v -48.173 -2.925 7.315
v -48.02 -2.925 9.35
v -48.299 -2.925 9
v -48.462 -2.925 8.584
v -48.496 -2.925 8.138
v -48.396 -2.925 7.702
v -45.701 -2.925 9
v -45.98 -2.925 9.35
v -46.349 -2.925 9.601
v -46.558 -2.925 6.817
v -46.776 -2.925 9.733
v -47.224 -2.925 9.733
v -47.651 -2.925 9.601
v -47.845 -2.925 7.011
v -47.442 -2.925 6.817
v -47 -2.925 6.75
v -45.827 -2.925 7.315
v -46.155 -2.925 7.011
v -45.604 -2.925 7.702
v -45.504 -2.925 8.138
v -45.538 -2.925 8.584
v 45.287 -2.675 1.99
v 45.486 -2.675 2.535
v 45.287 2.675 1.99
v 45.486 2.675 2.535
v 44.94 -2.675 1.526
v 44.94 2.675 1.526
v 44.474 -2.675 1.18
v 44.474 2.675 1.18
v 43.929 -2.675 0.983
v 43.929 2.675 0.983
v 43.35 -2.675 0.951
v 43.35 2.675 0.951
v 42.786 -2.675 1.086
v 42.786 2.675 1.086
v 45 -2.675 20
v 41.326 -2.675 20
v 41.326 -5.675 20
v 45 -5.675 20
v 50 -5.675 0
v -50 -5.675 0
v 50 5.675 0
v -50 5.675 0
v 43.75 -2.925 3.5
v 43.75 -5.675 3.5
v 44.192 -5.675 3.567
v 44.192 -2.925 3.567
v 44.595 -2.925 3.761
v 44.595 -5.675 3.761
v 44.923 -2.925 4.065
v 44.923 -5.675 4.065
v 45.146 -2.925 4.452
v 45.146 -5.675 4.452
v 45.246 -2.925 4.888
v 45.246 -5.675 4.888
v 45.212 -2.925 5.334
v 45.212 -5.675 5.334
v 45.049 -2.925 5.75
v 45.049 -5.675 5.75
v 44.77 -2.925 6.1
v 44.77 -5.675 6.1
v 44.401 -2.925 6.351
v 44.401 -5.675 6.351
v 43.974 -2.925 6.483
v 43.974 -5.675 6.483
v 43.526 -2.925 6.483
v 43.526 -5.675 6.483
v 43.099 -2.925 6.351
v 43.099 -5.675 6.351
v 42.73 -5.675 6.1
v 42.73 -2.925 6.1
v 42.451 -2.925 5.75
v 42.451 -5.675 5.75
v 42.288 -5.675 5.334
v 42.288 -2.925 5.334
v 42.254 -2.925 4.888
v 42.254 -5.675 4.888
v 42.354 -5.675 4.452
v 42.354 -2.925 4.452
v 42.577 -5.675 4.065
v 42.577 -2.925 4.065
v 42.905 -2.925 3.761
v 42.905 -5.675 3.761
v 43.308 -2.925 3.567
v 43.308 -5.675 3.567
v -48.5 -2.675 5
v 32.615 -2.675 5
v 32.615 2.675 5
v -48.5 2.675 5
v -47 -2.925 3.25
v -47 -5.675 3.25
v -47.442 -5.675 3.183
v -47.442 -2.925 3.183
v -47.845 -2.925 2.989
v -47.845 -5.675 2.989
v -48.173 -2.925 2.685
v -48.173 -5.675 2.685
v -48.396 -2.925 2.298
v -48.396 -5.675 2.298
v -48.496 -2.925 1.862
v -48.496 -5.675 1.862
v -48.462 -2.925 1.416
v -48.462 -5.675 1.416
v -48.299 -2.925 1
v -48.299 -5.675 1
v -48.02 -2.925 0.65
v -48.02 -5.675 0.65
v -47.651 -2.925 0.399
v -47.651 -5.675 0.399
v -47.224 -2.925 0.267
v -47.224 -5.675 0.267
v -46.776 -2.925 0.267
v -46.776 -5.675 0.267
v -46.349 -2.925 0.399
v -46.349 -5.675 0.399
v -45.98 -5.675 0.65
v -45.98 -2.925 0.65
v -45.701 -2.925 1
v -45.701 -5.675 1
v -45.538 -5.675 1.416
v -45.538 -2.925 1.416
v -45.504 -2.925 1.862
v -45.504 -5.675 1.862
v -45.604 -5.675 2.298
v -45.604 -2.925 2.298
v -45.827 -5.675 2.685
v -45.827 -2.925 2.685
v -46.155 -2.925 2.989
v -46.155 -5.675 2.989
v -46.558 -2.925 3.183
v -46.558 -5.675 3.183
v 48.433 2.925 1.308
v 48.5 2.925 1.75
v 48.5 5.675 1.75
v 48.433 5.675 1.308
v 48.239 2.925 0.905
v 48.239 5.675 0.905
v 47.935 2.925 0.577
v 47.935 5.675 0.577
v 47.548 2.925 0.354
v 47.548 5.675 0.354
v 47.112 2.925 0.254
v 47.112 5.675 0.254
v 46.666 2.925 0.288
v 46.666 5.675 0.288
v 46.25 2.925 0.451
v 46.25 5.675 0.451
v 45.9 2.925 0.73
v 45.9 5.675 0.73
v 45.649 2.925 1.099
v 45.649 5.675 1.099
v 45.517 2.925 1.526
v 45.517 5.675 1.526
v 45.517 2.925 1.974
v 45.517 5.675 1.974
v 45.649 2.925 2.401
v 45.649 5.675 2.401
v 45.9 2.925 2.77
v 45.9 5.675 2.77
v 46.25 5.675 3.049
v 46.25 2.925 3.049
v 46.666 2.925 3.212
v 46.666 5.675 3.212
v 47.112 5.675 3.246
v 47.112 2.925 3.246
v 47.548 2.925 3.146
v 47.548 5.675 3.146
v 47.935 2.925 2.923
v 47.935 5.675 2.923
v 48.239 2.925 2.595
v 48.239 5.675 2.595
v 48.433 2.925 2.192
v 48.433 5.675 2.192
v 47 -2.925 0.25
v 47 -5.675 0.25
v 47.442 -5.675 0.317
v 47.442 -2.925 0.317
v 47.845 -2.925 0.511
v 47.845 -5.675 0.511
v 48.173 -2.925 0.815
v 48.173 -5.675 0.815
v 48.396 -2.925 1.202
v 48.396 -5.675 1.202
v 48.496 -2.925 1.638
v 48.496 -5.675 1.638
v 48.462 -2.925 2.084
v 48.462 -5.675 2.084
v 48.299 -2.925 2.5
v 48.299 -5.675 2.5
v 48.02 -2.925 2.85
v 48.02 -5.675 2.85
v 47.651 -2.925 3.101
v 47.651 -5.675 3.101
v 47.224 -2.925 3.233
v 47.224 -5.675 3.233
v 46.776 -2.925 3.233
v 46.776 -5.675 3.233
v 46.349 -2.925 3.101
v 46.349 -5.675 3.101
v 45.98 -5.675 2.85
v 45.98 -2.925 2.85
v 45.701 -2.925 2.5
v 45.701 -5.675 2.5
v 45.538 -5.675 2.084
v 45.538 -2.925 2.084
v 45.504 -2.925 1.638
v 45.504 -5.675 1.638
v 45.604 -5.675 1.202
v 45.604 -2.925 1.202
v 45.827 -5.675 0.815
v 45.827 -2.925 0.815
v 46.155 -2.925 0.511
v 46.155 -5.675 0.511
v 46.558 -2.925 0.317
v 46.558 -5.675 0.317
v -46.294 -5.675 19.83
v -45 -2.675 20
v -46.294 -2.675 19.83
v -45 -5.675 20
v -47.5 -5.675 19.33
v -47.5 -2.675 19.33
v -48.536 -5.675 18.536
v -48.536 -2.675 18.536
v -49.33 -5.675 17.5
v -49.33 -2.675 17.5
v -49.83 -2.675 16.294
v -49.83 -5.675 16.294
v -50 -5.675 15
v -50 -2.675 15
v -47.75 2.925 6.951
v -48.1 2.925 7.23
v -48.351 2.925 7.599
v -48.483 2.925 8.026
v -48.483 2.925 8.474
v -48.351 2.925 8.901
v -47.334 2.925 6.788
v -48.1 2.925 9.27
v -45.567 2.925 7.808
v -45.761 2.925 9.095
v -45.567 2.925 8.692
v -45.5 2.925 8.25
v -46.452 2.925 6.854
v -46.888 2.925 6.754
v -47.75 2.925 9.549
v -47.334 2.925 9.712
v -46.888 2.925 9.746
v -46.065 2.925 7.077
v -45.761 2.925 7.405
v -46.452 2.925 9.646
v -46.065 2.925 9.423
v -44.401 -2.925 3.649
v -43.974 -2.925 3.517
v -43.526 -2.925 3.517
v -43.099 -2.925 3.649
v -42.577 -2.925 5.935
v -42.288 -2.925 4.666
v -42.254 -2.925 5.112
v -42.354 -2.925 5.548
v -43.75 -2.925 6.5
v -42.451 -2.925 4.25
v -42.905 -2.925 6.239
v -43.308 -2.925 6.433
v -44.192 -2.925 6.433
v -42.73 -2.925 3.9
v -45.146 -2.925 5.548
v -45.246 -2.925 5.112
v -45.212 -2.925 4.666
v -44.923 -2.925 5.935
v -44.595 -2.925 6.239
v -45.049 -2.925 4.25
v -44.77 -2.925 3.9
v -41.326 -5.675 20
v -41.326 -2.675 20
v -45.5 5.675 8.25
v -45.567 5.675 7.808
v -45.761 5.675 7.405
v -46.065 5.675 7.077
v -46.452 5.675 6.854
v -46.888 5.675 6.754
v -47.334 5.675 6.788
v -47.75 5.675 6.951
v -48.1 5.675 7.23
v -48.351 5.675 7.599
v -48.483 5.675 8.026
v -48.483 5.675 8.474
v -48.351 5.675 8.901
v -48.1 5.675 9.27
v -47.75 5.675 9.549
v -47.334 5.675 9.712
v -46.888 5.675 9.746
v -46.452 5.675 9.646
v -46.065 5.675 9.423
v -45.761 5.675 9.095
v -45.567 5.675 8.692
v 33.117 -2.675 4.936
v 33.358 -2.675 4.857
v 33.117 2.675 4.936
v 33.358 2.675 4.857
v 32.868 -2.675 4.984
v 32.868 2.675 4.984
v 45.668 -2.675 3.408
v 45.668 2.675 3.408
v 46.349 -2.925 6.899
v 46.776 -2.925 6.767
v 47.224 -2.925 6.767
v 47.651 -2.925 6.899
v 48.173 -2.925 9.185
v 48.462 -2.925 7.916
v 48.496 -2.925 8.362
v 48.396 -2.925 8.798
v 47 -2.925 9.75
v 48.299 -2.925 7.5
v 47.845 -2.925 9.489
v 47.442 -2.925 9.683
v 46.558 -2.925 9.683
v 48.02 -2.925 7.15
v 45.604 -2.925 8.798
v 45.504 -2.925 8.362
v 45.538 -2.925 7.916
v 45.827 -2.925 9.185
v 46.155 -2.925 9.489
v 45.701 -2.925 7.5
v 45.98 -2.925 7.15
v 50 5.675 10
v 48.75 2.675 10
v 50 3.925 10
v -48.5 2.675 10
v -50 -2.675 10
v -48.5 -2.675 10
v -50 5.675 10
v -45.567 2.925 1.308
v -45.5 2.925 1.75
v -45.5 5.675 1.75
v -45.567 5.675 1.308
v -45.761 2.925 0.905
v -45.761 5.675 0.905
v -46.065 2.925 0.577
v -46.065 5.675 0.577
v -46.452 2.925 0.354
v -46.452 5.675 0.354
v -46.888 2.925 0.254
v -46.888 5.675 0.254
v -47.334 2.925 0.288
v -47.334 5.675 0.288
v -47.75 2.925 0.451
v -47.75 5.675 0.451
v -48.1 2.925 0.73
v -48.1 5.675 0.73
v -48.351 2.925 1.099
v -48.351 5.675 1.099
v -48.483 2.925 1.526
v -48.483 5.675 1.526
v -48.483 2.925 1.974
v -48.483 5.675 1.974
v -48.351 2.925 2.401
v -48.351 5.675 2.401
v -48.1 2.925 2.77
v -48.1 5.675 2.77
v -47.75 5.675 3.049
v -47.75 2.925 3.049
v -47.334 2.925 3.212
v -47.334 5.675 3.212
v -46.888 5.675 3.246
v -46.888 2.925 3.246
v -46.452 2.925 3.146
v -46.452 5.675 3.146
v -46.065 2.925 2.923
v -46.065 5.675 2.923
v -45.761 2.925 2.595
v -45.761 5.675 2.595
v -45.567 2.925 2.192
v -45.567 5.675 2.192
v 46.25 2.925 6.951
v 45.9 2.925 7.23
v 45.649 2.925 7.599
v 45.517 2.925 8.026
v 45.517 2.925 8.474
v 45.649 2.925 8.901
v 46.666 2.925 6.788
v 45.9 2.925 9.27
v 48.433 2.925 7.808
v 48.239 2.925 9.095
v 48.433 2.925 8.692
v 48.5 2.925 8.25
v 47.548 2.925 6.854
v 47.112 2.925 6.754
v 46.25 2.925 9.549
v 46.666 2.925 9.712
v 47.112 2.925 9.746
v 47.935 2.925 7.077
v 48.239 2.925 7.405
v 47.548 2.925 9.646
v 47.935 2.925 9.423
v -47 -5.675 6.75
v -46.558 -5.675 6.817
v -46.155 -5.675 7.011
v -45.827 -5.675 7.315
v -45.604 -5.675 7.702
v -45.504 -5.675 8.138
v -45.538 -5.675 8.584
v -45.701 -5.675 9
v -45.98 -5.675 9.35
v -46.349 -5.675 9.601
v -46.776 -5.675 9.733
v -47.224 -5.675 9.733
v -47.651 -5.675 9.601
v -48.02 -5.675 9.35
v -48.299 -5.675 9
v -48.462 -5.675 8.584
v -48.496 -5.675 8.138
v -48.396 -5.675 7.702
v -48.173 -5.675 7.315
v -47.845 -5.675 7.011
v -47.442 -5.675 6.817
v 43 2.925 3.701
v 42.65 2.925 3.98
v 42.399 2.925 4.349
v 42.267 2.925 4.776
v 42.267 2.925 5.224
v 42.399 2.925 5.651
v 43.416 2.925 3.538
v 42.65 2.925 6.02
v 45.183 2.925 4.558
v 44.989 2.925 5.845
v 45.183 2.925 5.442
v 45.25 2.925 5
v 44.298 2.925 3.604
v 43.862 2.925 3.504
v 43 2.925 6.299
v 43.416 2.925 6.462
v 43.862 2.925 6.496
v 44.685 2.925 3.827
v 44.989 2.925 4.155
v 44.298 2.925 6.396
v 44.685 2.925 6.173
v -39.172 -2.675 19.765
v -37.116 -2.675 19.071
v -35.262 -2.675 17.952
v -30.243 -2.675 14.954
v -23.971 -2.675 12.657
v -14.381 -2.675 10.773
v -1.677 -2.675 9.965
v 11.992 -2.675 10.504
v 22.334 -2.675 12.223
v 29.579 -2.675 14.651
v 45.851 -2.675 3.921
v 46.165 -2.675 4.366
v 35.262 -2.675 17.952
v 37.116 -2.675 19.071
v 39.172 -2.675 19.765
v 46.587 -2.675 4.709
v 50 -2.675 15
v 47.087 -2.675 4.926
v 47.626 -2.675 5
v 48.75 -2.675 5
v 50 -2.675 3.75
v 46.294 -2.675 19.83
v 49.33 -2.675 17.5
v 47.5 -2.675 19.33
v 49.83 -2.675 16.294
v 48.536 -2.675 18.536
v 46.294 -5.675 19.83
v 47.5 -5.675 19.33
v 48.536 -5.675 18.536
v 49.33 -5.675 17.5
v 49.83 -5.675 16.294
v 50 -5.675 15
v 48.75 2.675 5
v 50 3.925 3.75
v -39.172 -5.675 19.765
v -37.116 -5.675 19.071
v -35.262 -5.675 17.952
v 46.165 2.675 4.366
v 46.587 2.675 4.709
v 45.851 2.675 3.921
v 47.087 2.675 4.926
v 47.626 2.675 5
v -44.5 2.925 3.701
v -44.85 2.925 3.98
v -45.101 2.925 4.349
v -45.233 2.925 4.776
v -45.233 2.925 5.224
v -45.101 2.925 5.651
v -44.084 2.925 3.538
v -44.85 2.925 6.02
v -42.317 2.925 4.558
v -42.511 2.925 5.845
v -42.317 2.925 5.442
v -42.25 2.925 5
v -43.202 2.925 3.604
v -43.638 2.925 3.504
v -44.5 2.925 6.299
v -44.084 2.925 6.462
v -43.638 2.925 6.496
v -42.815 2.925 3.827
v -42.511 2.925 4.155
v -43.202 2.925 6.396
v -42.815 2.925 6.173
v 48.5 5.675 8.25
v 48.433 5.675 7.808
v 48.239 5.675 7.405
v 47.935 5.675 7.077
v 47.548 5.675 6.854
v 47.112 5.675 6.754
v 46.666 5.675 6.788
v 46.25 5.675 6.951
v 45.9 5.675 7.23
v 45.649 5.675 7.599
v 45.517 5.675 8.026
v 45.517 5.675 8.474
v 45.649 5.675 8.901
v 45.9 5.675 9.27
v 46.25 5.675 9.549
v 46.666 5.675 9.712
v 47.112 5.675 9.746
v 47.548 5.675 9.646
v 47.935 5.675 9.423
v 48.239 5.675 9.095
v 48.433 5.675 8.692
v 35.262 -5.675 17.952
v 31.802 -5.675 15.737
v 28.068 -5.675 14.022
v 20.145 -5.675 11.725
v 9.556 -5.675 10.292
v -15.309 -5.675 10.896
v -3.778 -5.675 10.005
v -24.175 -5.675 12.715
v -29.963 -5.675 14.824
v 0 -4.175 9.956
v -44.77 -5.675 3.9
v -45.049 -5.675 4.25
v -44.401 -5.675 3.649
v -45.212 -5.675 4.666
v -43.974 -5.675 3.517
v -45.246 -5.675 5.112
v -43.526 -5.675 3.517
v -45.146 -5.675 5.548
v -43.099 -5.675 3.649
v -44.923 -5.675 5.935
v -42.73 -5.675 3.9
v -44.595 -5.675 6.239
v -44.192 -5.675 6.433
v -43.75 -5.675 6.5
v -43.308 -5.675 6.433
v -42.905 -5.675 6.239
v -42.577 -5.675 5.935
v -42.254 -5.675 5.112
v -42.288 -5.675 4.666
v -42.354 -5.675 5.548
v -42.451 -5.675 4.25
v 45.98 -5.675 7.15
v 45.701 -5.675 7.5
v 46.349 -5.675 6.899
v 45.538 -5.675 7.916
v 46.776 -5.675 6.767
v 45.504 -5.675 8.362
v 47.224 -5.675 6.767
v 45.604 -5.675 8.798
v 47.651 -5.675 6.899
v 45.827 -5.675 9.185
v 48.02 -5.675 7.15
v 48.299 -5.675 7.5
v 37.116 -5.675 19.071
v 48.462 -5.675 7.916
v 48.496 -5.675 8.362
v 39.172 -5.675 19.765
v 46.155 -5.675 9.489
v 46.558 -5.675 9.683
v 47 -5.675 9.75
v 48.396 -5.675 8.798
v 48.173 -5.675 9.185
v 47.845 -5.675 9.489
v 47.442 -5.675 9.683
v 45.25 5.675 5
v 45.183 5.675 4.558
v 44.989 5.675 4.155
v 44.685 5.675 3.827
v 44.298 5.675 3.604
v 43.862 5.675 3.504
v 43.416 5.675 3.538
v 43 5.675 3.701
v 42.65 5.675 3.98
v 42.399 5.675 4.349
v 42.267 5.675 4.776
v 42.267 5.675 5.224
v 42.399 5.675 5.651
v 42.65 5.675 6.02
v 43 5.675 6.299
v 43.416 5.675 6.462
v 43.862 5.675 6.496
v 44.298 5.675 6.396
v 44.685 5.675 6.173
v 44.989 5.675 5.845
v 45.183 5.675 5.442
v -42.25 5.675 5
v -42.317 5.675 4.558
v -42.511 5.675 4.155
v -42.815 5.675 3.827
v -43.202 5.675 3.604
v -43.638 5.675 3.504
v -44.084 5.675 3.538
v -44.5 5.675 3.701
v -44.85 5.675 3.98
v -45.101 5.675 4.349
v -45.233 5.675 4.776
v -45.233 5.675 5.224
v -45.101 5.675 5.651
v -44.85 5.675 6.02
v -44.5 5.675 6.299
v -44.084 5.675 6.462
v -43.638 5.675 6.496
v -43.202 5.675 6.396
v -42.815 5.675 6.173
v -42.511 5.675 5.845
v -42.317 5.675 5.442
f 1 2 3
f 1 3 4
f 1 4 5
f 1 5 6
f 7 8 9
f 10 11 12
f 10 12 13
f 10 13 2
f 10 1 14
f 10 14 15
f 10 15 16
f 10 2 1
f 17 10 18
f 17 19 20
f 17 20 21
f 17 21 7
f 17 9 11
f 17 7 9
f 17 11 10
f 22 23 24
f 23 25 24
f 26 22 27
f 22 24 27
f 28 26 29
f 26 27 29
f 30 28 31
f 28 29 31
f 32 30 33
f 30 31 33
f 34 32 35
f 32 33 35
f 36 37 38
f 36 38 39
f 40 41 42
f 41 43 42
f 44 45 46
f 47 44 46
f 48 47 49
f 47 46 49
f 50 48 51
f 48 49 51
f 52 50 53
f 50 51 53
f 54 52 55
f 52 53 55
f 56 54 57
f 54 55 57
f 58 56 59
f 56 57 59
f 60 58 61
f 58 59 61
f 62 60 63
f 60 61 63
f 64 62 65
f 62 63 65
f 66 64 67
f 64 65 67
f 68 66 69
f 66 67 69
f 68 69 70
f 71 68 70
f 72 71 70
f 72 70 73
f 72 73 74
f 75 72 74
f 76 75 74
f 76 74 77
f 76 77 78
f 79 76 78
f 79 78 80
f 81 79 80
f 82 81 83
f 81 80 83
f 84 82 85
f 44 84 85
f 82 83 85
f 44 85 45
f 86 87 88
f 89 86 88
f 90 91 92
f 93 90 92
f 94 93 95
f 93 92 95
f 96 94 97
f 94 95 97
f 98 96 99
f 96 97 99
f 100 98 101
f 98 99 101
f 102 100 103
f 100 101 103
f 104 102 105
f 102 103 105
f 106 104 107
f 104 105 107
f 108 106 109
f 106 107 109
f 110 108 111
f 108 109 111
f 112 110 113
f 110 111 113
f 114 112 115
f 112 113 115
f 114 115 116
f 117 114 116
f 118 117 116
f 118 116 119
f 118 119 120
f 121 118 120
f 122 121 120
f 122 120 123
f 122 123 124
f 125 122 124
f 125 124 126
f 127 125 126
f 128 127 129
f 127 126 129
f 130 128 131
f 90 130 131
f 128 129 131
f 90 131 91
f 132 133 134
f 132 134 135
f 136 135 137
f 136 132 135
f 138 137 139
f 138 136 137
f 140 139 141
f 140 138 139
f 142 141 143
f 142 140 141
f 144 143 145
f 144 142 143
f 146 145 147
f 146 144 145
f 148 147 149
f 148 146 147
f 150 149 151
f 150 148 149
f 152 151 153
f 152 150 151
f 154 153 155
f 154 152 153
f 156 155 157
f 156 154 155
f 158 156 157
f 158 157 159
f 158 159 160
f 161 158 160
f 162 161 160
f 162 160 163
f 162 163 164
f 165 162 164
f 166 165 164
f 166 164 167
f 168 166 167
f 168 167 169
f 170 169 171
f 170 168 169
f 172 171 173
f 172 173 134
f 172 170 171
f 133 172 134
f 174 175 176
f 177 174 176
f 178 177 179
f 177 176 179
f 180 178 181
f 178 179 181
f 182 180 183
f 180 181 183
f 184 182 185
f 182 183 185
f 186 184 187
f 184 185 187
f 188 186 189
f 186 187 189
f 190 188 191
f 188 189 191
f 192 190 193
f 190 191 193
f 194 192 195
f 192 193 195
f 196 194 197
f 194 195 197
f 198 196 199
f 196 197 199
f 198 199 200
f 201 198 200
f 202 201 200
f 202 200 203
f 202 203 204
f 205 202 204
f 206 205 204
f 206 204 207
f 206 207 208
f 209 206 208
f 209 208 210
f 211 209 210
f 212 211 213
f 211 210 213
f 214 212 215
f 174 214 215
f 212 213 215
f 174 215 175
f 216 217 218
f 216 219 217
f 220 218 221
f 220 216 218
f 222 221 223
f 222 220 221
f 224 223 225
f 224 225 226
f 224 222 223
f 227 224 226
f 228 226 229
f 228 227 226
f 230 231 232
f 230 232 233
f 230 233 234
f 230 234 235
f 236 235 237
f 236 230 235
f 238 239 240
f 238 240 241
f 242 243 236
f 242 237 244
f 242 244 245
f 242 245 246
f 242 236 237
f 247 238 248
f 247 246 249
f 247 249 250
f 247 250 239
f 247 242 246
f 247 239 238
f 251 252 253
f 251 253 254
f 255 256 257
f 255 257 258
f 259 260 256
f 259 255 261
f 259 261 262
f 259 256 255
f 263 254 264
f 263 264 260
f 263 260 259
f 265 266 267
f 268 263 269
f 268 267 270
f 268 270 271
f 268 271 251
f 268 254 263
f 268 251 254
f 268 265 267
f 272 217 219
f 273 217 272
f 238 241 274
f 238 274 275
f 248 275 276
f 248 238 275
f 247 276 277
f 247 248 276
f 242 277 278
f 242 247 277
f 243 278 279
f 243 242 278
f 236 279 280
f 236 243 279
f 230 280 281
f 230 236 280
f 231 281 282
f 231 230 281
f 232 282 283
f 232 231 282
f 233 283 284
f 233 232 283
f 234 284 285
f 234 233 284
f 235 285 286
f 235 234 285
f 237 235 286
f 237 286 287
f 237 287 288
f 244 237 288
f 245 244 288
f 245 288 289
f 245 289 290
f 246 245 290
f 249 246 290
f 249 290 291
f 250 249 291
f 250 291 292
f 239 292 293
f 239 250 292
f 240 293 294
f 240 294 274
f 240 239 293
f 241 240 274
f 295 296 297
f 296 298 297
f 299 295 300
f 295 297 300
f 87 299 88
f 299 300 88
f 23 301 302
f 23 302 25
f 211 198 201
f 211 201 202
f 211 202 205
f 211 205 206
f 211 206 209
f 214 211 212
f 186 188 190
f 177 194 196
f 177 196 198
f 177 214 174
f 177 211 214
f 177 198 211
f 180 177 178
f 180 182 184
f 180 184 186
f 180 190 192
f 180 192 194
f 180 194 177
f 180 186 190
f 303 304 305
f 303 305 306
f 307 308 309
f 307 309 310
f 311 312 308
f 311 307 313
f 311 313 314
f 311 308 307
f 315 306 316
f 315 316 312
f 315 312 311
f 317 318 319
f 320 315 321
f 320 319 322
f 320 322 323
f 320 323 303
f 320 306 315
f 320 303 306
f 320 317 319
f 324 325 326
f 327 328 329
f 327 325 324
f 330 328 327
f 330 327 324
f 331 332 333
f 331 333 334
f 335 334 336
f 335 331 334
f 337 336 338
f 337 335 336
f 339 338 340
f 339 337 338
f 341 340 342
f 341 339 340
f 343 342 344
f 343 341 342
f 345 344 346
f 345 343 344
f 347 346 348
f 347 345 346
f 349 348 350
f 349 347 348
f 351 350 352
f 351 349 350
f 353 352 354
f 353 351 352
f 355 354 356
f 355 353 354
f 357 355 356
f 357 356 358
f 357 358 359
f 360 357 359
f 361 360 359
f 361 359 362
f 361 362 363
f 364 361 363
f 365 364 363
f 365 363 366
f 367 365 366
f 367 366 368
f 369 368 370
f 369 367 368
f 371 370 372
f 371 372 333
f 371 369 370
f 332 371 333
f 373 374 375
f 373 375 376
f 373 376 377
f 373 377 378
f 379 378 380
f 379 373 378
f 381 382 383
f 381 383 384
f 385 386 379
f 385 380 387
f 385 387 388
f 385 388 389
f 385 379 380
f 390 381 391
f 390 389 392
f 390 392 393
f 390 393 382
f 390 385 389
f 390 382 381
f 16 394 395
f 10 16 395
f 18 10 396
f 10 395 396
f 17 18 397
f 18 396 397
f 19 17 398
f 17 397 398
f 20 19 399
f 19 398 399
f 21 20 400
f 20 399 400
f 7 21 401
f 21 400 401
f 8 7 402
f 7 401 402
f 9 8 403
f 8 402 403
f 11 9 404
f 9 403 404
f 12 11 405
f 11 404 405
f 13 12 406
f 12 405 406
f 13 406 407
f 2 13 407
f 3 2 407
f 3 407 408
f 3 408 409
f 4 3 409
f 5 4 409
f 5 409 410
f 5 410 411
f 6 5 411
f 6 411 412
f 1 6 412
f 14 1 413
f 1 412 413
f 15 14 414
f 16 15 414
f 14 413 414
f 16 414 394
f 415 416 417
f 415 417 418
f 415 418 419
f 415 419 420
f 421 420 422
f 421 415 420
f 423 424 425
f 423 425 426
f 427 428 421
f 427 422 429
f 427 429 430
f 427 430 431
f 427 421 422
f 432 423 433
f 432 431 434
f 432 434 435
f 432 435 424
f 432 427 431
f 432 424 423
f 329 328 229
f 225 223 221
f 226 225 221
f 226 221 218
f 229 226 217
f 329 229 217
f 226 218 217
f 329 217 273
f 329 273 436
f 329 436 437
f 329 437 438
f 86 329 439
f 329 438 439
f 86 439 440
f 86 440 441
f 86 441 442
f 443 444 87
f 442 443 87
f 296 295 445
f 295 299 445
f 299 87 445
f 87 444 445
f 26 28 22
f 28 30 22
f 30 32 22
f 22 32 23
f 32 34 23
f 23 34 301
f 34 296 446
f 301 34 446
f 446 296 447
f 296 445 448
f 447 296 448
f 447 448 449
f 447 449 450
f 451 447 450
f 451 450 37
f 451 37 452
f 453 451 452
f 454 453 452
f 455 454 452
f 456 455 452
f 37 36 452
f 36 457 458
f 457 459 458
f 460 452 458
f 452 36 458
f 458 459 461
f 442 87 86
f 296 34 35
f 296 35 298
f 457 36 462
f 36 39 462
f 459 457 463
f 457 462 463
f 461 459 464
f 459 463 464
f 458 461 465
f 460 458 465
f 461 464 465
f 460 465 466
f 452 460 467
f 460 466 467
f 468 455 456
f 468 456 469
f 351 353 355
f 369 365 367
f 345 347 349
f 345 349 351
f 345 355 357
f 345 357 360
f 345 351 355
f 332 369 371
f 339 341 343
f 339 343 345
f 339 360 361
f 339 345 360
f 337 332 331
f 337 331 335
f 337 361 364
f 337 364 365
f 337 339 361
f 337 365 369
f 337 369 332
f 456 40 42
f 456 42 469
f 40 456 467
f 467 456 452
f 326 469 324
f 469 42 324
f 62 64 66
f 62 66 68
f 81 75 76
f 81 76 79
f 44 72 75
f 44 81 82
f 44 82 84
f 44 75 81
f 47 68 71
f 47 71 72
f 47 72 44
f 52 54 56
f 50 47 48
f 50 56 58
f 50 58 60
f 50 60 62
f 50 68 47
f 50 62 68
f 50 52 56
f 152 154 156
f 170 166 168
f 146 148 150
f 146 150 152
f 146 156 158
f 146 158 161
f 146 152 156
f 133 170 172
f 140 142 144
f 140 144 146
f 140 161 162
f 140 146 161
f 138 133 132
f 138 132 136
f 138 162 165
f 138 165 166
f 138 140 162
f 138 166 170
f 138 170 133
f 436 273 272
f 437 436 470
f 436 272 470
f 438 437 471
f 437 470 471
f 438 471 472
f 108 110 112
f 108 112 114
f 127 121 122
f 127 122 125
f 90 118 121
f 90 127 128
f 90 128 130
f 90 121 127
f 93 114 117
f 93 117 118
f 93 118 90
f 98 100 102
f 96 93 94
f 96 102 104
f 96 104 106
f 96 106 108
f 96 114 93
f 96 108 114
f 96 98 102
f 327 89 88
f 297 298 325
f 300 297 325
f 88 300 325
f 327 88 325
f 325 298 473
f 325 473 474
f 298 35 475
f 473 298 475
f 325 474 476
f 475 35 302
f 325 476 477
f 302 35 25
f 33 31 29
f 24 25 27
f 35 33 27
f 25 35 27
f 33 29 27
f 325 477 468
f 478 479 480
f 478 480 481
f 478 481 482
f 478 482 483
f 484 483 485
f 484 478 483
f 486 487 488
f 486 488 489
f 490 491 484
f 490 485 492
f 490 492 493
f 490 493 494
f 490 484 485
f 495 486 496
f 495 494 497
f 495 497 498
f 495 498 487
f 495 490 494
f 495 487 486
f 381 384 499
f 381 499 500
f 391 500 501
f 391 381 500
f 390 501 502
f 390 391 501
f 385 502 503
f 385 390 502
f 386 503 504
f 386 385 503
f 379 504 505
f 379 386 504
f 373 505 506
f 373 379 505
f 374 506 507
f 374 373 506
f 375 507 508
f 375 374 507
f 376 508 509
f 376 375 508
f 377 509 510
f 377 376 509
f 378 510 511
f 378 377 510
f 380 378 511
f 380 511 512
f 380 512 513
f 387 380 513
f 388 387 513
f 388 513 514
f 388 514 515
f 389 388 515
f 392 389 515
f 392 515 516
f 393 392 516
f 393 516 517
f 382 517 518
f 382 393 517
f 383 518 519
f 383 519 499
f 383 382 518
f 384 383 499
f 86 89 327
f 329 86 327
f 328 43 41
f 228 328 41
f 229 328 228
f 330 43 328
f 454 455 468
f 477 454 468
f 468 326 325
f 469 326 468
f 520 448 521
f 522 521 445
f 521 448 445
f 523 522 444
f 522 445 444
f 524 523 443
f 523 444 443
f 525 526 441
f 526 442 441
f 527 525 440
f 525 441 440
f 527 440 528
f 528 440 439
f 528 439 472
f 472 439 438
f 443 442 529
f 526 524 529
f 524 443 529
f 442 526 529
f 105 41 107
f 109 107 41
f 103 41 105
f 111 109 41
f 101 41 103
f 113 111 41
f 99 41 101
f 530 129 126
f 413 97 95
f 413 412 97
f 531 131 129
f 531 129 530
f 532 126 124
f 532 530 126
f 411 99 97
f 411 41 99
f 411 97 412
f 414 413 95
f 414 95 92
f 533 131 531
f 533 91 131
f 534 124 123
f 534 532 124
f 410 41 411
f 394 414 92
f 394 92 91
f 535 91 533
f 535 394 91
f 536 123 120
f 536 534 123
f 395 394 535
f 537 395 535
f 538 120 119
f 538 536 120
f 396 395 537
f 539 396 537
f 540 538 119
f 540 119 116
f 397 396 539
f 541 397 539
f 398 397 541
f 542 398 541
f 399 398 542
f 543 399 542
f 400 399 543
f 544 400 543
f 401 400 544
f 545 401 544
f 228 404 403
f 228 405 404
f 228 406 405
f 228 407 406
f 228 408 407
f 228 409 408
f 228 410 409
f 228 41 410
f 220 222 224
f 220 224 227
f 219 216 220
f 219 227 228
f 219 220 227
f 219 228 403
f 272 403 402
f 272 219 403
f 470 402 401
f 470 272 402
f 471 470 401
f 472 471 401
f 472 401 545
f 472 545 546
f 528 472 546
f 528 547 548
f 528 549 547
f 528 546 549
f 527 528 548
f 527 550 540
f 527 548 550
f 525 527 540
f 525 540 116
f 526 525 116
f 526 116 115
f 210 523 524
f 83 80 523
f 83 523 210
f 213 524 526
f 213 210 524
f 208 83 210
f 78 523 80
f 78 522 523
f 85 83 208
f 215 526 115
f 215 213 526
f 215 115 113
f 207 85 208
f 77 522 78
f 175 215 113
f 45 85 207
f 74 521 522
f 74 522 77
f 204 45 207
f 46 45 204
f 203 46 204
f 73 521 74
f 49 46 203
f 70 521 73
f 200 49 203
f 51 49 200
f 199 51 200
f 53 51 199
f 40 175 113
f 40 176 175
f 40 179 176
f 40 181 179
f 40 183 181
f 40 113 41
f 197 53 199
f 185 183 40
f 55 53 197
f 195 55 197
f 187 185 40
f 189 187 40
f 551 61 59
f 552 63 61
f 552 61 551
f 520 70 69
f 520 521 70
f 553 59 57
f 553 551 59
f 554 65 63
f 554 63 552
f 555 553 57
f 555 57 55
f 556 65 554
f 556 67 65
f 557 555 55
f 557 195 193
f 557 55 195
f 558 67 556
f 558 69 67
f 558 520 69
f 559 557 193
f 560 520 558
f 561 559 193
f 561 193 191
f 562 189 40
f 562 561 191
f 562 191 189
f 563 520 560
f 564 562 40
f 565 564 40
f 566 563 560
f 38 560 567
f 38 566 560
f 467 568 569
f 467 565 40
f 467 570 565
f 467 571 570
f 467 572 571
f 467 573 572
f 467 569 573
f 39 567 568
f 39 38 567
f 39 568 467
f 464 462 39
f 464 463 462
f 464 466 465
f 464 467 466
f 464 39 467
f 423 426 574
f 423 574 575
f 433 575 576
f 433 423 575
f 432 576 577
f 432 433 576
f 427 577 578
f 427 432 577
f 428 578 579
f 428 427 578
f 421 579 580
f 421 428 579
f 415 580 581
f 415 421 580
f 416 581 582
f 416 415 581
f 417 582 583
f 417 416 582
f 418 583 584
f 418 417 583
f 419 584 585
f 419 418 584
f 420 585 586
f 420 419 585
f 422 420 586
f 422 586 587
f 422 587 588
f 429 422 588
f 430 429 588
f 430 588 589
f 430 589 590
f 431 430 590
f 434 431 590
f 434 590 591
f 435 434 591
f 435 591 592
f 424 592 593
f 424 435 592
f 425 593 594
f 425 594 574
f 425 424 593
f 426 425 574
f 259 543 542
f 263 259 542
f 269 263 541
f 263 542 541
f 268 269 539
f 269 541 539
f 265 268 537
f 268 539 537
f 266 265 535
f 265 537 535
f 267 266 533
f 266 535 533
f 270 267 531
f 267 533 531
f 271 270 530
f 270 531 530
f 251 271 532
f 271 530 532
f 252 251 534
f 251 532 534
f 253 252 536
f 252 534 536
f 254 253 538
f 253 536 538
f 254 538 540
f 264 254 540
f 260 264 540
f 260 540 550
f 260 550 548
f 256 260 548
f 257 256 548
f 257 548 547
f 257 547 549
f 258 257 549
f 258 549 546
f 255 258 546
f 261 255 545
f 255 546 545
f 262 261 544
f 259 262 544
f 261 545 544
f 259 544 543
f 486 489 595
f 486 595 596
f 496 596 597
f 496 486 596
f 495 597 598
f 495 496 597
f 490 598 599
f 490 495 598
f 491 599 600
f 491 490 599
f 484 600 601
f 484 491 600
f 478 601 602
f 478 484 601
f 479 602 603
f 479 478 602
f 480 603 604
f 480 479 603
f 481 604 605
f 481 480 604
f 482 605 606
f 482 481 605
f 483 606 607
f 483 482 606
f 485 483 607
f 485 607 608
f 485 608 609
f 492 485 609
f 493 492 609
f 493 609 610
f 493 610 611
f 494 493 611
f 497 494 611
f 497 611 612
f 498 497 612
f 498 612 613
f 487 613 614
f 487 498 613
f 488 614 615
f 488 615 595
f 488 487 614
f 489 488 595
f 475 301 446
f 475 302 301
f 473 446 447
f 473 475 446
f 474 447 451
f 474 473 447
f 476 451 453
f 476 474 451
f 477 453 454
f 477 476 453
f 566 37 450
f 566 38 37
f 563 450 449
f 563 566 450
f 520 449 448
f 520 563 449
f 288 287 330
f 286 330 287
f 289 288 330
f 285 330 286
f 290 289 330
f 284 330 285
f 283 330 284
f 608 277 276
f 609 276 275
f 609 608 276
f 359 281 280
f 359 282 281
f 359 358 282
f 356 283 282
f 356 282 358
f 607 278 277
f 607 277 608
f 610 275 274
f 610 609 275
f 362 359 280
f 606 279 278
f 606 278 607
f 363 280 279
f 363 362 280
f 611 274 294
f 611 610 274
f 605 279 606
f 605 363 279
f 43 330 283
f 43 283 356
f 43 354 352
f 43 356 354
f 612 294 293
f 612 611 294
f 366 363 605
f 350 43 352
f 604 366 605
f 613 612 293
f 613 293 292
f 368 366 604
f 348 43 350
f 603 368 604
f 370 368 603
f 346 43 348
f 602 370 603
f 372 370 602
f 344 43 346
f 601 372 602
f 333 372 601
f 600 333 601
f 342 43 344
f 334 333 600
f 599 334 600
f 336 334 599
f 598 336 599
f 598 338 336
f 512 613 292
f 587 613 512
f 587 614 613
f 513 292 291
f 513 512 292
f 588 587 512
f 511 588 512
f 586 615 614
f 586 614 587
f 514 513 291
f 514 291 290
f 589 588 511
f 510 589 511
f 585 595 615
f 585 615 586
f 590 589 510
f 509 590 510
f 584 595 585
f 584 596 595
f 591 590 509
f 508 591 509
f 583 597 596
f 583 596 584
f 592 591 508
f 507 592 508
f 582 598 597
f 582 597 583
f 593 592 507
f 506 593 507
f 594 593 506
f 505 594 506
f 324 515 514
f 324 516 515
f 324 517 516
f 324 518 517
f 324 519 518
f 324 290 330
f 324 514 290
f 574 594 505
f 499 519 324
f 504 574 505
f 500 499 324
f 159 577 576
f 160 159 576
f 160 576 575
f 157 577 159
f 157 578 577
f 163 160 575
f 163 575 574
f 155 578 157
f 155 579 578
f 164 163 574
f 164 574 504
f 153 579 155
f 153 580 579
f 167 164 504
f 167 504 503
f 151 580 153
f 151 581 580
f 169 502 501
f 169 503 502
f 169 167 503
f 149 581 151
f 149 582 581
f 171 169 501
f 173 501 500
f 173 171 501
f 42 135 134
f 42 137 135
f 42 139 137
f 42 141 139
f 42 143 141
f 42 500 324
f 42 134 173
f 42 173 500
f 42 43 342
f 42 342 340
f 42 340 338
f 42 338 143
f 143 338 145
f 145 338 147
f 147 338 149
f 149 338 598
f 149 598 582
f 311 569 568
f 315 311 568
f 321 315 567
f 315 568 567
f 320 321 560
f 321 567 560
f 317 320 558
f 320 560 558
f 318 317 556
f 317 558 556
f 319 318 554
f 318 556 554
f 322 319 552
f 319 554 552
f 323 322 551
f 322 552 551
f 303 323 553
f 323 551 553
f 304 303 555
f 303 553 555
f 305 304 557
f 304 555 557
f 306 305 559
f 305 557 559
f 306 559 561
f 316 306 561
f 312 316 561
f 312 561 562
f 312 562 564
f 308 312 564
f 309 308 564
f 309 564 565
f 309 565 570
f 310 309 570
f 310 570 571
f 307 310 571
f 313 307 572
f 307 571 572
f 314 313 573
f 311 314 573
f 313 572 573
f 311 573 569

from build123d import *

# Parameters (mm, degrees)
ESBO_O1_W                = 5
ESBO_O1_H                = 5.35
RESSALTO_EXTRUS_O1_DEPTH = 50
CORTE_EXTRUS_O5_START    = -2.675
CORTE_EXTRUS_O5_DEPTH    = 5.35
FILETE2_R                = 2
SKETCH1_W                = 100
SKETCH1_H                = 10
BOSS_EXTRUDE1_DEPTH      = 3
SKETCH2_W                = 100
SKETCH2_H                = 20
BOSS_EXTRUDE2_DEPTH      = 3
FILLET1_R                = 2
FILLET2_R                = 2
CUT_EXTRUDE1_START       = 2.925
CUT_EXTRUDE1_OUTLINE_R   = 1.5
CUT_EXTRUDE1_DEPTH       = 2.75
SKETCH6_W                = 5
SKETCH6_H                = 5.35
BOSS_EXTRUDE4_DEPTH      = 1.5
SKETCH8_R                = 1.5
CUT_EXTRUDE2_DEPTH       = 2.75
CHAMFER2_SIZE            = 1.25
CUT_EXTRUDE3_DEPTH       = 10
FILLET3_R                = 10
FILLET4_R                = 5


# Read off the part's stored shape, not the designer's step: Corte-extrusão5, Cut-Extrude1
with BuildPart() as part:
    # Esboço1 → Ressalto-extrusão1 (new, symmetric)
    with BuildSketch(Plane(origin=(0, 0, 0), x_dir=(0, 0, -1), z_dir=(1, 0, 0))):
        with Locations((-2.5, 0)):
            Rectangle(ESBO_O1_W, ESBO_O1_H)
    extrude(amount=RESSALTO_EXTRUS_O1_DEPTH, both=True)

    # Corte-extrusão5 outline → Corte-extrusão5 (cut)
    with BuildSketch(Plane(origin=(0, 0, 0), x_dir=(1, 0, 0), z_dir=(0, 1, 0)).offset(CORTE_EXTRUS_O5_START)):
        Polygon((46, -5), (45, -0.2), (33, -5), align=None)
    extrude(amount=CORTE_EXTRUS_O5_DEPTH, mode=Mode.SUBTRACT)

    # Filete2
    filete2_edges = [part.edges().sort_by_distance(p)[0] for p in [
        (46, 0, 5),
    ]]
    fillet(filete2_edges, radius=FILETE2_R)

    # Sketch1 → Boss-Extrude1 (add)
    with BuildSketch(Plane(origin=(0, 2.675, 0), x_dir=(1, 0, 0), z_dir=(0, 1, 0))):
        with Locations((0, -5)):
            Rectangle(SKETCH1_W, SKETCH1_H)
    extrude(amount=BOSS_EXTRUDE1_DEPTH)

    # Sketch2 → Boss-Extrude2 (add)
    with BuildSketch(Plane.XZ.offset(2.675)):
        with Locations((0, 10)):
            Rectangle(SKETCH2_W, SKETCH2_H)
    extrude(amount=BOSS_EXTRUDE2_DEPTH)

    # Fillet1
    fillet1_edges = [part.edges().sort_by_distance(p)[0] for p in [
        (45, 0, 0.2),
    ]]
    fillet(fillet1_edges, radius=FILLET1_R)

    # Fillet2
    fillet2_edges = [part.edges().sort_by_distance(p)[0] for p in [
        (33, 0, 5),
    ]]
    fillet(fillet2_edges, radius=FILLET2_R)

    # Cut-Extrude1 outline → Cut-Extrude1 (cut)
    with BuildSketch(Plane(origin=(0, 0, 0), x_dir=(1, 0, 0), z_dir=(0, 1, 0)).offset(CUT_EXTRUDE1_START)):
        with Locations((-43.75, -5)):
            Circle(CUT_EXTRUDE1_OUTLINE_R)
        with Locations((43.75, -5)):
            Circle(CUT_EXTRUDE1_OUTLINE_R)
        with Locations((47, -1.75)):
            Circle(CUT_EXTRUDE1_OUTLINE_R)
        with Locations((47, -8.25)):
            Circle(CUT_EXTRUDE1_OUTLINE_R)
        with Locations((-47, -8.25)):
            Circle(CUT_EXTRUDE1_OUTLINE_R)
        with Locations((-47, -1.75)):
            Circle(CUT_EXTRUDE1_OUTLINE_R)
    extrude(amount=CUT_EXTRUDE1_DEPTH, mode=Mode.SUBTRACT)

    # Sketch6 → Boss-Extrude4 (add)
    with BuildSketch(Plane.ZY.offset(50)):
        with Locations((7.5, 0)):
            Rectangle(SKETCH6_W, SKETCH6_H)
    extrude(amount=-BOSS_EXTRUDE4_DEPTH)

    # Sketch8 → Cut-Extrude2 (cut)
    with BuildSketch(Plane.XZ.offset(5.675)):
        with Locations(Location((47, 8.25, 0), (0, 0, 90))):
            Circle(SKETCH8_R)
        with Locations(Location((43.75, 5, 0), (0, 0, 270))):
            Circle(SKETCH8_R)
        with Locations(Location((47, 1.75, 0), (0, 0, 270))):
            Circle(SKETCH8_R)
        with Locations(Location((-47, 8.25, 0), (0, 0, 270))):
            Circle(SKETCH8_R)
        with Locations(Location((-43.75, 5, 0), (0, 0, 90))):
            Circle(SKETCH8_R)
        with Locations(Location((-47, 1.75, 0), (0, 0, 90))):
            Circle(SKETCH8_R)
    extrude(amount=-CUT_EXTRUDE2_DEPTH, mode=Mode.SUBTRACT)

    # Chamfer2
    chamfer2_edges = [part.edges().sort_by_distance(p)[0] for p in [
        (50, 2.675, 7.5),
        (50, 0, 5),
    ]]
    chamfer(chamfer2_edges, length=CHAMFER2_SIZE)

    # Sketch10 → Cut-Extrude3 (cut)
    with BuildSketch(Plane(origin=(0, -2.675, 0), x_dir=(1, 0, 0), z_dir=(0, 1, 0))):
        with BuildLine():
            Line((-37.586485056, -20), (37.586485056, -20))
            add(Edge.make_bspline(
                [(37.586485056, -20), (27.768328162, -9.955951582), (0, -9.955951582)],
                knots=[0, 0, 0, 1, 1, 1], degree=2))
            add(Edge.make_bspline(
                [(-37.586485056, -20), (-27.768328162, -9.955951582), (0, -9.955951582)],
                knots=[0, 0, 0, 1, 1, 1], degree=2))
        make_face()
    extrude(amount=-CUT_EXTRUDE3_DEPTH, mode=Mode.SUBTRACT)

    # Fillet3
    fillet3_edges = [part.edges().sort_by_distance(p)[0] for p in [
        (37.586485056, -4.175, 20),
        (-37.586485056, -4.175, 20),
    ]]
    fillet(fillet3_edges, radius=FILLET3_R)

    # Fillet4
    fillet4_edges = [part.edges().sort_by_distance(p)[0] for p in [
        (-50, -4.175, 20),
        (50, -4.175, 20),
    ]]
    fillet(fillet4_edges, radius=FILLET4_R)


solid = part.part
